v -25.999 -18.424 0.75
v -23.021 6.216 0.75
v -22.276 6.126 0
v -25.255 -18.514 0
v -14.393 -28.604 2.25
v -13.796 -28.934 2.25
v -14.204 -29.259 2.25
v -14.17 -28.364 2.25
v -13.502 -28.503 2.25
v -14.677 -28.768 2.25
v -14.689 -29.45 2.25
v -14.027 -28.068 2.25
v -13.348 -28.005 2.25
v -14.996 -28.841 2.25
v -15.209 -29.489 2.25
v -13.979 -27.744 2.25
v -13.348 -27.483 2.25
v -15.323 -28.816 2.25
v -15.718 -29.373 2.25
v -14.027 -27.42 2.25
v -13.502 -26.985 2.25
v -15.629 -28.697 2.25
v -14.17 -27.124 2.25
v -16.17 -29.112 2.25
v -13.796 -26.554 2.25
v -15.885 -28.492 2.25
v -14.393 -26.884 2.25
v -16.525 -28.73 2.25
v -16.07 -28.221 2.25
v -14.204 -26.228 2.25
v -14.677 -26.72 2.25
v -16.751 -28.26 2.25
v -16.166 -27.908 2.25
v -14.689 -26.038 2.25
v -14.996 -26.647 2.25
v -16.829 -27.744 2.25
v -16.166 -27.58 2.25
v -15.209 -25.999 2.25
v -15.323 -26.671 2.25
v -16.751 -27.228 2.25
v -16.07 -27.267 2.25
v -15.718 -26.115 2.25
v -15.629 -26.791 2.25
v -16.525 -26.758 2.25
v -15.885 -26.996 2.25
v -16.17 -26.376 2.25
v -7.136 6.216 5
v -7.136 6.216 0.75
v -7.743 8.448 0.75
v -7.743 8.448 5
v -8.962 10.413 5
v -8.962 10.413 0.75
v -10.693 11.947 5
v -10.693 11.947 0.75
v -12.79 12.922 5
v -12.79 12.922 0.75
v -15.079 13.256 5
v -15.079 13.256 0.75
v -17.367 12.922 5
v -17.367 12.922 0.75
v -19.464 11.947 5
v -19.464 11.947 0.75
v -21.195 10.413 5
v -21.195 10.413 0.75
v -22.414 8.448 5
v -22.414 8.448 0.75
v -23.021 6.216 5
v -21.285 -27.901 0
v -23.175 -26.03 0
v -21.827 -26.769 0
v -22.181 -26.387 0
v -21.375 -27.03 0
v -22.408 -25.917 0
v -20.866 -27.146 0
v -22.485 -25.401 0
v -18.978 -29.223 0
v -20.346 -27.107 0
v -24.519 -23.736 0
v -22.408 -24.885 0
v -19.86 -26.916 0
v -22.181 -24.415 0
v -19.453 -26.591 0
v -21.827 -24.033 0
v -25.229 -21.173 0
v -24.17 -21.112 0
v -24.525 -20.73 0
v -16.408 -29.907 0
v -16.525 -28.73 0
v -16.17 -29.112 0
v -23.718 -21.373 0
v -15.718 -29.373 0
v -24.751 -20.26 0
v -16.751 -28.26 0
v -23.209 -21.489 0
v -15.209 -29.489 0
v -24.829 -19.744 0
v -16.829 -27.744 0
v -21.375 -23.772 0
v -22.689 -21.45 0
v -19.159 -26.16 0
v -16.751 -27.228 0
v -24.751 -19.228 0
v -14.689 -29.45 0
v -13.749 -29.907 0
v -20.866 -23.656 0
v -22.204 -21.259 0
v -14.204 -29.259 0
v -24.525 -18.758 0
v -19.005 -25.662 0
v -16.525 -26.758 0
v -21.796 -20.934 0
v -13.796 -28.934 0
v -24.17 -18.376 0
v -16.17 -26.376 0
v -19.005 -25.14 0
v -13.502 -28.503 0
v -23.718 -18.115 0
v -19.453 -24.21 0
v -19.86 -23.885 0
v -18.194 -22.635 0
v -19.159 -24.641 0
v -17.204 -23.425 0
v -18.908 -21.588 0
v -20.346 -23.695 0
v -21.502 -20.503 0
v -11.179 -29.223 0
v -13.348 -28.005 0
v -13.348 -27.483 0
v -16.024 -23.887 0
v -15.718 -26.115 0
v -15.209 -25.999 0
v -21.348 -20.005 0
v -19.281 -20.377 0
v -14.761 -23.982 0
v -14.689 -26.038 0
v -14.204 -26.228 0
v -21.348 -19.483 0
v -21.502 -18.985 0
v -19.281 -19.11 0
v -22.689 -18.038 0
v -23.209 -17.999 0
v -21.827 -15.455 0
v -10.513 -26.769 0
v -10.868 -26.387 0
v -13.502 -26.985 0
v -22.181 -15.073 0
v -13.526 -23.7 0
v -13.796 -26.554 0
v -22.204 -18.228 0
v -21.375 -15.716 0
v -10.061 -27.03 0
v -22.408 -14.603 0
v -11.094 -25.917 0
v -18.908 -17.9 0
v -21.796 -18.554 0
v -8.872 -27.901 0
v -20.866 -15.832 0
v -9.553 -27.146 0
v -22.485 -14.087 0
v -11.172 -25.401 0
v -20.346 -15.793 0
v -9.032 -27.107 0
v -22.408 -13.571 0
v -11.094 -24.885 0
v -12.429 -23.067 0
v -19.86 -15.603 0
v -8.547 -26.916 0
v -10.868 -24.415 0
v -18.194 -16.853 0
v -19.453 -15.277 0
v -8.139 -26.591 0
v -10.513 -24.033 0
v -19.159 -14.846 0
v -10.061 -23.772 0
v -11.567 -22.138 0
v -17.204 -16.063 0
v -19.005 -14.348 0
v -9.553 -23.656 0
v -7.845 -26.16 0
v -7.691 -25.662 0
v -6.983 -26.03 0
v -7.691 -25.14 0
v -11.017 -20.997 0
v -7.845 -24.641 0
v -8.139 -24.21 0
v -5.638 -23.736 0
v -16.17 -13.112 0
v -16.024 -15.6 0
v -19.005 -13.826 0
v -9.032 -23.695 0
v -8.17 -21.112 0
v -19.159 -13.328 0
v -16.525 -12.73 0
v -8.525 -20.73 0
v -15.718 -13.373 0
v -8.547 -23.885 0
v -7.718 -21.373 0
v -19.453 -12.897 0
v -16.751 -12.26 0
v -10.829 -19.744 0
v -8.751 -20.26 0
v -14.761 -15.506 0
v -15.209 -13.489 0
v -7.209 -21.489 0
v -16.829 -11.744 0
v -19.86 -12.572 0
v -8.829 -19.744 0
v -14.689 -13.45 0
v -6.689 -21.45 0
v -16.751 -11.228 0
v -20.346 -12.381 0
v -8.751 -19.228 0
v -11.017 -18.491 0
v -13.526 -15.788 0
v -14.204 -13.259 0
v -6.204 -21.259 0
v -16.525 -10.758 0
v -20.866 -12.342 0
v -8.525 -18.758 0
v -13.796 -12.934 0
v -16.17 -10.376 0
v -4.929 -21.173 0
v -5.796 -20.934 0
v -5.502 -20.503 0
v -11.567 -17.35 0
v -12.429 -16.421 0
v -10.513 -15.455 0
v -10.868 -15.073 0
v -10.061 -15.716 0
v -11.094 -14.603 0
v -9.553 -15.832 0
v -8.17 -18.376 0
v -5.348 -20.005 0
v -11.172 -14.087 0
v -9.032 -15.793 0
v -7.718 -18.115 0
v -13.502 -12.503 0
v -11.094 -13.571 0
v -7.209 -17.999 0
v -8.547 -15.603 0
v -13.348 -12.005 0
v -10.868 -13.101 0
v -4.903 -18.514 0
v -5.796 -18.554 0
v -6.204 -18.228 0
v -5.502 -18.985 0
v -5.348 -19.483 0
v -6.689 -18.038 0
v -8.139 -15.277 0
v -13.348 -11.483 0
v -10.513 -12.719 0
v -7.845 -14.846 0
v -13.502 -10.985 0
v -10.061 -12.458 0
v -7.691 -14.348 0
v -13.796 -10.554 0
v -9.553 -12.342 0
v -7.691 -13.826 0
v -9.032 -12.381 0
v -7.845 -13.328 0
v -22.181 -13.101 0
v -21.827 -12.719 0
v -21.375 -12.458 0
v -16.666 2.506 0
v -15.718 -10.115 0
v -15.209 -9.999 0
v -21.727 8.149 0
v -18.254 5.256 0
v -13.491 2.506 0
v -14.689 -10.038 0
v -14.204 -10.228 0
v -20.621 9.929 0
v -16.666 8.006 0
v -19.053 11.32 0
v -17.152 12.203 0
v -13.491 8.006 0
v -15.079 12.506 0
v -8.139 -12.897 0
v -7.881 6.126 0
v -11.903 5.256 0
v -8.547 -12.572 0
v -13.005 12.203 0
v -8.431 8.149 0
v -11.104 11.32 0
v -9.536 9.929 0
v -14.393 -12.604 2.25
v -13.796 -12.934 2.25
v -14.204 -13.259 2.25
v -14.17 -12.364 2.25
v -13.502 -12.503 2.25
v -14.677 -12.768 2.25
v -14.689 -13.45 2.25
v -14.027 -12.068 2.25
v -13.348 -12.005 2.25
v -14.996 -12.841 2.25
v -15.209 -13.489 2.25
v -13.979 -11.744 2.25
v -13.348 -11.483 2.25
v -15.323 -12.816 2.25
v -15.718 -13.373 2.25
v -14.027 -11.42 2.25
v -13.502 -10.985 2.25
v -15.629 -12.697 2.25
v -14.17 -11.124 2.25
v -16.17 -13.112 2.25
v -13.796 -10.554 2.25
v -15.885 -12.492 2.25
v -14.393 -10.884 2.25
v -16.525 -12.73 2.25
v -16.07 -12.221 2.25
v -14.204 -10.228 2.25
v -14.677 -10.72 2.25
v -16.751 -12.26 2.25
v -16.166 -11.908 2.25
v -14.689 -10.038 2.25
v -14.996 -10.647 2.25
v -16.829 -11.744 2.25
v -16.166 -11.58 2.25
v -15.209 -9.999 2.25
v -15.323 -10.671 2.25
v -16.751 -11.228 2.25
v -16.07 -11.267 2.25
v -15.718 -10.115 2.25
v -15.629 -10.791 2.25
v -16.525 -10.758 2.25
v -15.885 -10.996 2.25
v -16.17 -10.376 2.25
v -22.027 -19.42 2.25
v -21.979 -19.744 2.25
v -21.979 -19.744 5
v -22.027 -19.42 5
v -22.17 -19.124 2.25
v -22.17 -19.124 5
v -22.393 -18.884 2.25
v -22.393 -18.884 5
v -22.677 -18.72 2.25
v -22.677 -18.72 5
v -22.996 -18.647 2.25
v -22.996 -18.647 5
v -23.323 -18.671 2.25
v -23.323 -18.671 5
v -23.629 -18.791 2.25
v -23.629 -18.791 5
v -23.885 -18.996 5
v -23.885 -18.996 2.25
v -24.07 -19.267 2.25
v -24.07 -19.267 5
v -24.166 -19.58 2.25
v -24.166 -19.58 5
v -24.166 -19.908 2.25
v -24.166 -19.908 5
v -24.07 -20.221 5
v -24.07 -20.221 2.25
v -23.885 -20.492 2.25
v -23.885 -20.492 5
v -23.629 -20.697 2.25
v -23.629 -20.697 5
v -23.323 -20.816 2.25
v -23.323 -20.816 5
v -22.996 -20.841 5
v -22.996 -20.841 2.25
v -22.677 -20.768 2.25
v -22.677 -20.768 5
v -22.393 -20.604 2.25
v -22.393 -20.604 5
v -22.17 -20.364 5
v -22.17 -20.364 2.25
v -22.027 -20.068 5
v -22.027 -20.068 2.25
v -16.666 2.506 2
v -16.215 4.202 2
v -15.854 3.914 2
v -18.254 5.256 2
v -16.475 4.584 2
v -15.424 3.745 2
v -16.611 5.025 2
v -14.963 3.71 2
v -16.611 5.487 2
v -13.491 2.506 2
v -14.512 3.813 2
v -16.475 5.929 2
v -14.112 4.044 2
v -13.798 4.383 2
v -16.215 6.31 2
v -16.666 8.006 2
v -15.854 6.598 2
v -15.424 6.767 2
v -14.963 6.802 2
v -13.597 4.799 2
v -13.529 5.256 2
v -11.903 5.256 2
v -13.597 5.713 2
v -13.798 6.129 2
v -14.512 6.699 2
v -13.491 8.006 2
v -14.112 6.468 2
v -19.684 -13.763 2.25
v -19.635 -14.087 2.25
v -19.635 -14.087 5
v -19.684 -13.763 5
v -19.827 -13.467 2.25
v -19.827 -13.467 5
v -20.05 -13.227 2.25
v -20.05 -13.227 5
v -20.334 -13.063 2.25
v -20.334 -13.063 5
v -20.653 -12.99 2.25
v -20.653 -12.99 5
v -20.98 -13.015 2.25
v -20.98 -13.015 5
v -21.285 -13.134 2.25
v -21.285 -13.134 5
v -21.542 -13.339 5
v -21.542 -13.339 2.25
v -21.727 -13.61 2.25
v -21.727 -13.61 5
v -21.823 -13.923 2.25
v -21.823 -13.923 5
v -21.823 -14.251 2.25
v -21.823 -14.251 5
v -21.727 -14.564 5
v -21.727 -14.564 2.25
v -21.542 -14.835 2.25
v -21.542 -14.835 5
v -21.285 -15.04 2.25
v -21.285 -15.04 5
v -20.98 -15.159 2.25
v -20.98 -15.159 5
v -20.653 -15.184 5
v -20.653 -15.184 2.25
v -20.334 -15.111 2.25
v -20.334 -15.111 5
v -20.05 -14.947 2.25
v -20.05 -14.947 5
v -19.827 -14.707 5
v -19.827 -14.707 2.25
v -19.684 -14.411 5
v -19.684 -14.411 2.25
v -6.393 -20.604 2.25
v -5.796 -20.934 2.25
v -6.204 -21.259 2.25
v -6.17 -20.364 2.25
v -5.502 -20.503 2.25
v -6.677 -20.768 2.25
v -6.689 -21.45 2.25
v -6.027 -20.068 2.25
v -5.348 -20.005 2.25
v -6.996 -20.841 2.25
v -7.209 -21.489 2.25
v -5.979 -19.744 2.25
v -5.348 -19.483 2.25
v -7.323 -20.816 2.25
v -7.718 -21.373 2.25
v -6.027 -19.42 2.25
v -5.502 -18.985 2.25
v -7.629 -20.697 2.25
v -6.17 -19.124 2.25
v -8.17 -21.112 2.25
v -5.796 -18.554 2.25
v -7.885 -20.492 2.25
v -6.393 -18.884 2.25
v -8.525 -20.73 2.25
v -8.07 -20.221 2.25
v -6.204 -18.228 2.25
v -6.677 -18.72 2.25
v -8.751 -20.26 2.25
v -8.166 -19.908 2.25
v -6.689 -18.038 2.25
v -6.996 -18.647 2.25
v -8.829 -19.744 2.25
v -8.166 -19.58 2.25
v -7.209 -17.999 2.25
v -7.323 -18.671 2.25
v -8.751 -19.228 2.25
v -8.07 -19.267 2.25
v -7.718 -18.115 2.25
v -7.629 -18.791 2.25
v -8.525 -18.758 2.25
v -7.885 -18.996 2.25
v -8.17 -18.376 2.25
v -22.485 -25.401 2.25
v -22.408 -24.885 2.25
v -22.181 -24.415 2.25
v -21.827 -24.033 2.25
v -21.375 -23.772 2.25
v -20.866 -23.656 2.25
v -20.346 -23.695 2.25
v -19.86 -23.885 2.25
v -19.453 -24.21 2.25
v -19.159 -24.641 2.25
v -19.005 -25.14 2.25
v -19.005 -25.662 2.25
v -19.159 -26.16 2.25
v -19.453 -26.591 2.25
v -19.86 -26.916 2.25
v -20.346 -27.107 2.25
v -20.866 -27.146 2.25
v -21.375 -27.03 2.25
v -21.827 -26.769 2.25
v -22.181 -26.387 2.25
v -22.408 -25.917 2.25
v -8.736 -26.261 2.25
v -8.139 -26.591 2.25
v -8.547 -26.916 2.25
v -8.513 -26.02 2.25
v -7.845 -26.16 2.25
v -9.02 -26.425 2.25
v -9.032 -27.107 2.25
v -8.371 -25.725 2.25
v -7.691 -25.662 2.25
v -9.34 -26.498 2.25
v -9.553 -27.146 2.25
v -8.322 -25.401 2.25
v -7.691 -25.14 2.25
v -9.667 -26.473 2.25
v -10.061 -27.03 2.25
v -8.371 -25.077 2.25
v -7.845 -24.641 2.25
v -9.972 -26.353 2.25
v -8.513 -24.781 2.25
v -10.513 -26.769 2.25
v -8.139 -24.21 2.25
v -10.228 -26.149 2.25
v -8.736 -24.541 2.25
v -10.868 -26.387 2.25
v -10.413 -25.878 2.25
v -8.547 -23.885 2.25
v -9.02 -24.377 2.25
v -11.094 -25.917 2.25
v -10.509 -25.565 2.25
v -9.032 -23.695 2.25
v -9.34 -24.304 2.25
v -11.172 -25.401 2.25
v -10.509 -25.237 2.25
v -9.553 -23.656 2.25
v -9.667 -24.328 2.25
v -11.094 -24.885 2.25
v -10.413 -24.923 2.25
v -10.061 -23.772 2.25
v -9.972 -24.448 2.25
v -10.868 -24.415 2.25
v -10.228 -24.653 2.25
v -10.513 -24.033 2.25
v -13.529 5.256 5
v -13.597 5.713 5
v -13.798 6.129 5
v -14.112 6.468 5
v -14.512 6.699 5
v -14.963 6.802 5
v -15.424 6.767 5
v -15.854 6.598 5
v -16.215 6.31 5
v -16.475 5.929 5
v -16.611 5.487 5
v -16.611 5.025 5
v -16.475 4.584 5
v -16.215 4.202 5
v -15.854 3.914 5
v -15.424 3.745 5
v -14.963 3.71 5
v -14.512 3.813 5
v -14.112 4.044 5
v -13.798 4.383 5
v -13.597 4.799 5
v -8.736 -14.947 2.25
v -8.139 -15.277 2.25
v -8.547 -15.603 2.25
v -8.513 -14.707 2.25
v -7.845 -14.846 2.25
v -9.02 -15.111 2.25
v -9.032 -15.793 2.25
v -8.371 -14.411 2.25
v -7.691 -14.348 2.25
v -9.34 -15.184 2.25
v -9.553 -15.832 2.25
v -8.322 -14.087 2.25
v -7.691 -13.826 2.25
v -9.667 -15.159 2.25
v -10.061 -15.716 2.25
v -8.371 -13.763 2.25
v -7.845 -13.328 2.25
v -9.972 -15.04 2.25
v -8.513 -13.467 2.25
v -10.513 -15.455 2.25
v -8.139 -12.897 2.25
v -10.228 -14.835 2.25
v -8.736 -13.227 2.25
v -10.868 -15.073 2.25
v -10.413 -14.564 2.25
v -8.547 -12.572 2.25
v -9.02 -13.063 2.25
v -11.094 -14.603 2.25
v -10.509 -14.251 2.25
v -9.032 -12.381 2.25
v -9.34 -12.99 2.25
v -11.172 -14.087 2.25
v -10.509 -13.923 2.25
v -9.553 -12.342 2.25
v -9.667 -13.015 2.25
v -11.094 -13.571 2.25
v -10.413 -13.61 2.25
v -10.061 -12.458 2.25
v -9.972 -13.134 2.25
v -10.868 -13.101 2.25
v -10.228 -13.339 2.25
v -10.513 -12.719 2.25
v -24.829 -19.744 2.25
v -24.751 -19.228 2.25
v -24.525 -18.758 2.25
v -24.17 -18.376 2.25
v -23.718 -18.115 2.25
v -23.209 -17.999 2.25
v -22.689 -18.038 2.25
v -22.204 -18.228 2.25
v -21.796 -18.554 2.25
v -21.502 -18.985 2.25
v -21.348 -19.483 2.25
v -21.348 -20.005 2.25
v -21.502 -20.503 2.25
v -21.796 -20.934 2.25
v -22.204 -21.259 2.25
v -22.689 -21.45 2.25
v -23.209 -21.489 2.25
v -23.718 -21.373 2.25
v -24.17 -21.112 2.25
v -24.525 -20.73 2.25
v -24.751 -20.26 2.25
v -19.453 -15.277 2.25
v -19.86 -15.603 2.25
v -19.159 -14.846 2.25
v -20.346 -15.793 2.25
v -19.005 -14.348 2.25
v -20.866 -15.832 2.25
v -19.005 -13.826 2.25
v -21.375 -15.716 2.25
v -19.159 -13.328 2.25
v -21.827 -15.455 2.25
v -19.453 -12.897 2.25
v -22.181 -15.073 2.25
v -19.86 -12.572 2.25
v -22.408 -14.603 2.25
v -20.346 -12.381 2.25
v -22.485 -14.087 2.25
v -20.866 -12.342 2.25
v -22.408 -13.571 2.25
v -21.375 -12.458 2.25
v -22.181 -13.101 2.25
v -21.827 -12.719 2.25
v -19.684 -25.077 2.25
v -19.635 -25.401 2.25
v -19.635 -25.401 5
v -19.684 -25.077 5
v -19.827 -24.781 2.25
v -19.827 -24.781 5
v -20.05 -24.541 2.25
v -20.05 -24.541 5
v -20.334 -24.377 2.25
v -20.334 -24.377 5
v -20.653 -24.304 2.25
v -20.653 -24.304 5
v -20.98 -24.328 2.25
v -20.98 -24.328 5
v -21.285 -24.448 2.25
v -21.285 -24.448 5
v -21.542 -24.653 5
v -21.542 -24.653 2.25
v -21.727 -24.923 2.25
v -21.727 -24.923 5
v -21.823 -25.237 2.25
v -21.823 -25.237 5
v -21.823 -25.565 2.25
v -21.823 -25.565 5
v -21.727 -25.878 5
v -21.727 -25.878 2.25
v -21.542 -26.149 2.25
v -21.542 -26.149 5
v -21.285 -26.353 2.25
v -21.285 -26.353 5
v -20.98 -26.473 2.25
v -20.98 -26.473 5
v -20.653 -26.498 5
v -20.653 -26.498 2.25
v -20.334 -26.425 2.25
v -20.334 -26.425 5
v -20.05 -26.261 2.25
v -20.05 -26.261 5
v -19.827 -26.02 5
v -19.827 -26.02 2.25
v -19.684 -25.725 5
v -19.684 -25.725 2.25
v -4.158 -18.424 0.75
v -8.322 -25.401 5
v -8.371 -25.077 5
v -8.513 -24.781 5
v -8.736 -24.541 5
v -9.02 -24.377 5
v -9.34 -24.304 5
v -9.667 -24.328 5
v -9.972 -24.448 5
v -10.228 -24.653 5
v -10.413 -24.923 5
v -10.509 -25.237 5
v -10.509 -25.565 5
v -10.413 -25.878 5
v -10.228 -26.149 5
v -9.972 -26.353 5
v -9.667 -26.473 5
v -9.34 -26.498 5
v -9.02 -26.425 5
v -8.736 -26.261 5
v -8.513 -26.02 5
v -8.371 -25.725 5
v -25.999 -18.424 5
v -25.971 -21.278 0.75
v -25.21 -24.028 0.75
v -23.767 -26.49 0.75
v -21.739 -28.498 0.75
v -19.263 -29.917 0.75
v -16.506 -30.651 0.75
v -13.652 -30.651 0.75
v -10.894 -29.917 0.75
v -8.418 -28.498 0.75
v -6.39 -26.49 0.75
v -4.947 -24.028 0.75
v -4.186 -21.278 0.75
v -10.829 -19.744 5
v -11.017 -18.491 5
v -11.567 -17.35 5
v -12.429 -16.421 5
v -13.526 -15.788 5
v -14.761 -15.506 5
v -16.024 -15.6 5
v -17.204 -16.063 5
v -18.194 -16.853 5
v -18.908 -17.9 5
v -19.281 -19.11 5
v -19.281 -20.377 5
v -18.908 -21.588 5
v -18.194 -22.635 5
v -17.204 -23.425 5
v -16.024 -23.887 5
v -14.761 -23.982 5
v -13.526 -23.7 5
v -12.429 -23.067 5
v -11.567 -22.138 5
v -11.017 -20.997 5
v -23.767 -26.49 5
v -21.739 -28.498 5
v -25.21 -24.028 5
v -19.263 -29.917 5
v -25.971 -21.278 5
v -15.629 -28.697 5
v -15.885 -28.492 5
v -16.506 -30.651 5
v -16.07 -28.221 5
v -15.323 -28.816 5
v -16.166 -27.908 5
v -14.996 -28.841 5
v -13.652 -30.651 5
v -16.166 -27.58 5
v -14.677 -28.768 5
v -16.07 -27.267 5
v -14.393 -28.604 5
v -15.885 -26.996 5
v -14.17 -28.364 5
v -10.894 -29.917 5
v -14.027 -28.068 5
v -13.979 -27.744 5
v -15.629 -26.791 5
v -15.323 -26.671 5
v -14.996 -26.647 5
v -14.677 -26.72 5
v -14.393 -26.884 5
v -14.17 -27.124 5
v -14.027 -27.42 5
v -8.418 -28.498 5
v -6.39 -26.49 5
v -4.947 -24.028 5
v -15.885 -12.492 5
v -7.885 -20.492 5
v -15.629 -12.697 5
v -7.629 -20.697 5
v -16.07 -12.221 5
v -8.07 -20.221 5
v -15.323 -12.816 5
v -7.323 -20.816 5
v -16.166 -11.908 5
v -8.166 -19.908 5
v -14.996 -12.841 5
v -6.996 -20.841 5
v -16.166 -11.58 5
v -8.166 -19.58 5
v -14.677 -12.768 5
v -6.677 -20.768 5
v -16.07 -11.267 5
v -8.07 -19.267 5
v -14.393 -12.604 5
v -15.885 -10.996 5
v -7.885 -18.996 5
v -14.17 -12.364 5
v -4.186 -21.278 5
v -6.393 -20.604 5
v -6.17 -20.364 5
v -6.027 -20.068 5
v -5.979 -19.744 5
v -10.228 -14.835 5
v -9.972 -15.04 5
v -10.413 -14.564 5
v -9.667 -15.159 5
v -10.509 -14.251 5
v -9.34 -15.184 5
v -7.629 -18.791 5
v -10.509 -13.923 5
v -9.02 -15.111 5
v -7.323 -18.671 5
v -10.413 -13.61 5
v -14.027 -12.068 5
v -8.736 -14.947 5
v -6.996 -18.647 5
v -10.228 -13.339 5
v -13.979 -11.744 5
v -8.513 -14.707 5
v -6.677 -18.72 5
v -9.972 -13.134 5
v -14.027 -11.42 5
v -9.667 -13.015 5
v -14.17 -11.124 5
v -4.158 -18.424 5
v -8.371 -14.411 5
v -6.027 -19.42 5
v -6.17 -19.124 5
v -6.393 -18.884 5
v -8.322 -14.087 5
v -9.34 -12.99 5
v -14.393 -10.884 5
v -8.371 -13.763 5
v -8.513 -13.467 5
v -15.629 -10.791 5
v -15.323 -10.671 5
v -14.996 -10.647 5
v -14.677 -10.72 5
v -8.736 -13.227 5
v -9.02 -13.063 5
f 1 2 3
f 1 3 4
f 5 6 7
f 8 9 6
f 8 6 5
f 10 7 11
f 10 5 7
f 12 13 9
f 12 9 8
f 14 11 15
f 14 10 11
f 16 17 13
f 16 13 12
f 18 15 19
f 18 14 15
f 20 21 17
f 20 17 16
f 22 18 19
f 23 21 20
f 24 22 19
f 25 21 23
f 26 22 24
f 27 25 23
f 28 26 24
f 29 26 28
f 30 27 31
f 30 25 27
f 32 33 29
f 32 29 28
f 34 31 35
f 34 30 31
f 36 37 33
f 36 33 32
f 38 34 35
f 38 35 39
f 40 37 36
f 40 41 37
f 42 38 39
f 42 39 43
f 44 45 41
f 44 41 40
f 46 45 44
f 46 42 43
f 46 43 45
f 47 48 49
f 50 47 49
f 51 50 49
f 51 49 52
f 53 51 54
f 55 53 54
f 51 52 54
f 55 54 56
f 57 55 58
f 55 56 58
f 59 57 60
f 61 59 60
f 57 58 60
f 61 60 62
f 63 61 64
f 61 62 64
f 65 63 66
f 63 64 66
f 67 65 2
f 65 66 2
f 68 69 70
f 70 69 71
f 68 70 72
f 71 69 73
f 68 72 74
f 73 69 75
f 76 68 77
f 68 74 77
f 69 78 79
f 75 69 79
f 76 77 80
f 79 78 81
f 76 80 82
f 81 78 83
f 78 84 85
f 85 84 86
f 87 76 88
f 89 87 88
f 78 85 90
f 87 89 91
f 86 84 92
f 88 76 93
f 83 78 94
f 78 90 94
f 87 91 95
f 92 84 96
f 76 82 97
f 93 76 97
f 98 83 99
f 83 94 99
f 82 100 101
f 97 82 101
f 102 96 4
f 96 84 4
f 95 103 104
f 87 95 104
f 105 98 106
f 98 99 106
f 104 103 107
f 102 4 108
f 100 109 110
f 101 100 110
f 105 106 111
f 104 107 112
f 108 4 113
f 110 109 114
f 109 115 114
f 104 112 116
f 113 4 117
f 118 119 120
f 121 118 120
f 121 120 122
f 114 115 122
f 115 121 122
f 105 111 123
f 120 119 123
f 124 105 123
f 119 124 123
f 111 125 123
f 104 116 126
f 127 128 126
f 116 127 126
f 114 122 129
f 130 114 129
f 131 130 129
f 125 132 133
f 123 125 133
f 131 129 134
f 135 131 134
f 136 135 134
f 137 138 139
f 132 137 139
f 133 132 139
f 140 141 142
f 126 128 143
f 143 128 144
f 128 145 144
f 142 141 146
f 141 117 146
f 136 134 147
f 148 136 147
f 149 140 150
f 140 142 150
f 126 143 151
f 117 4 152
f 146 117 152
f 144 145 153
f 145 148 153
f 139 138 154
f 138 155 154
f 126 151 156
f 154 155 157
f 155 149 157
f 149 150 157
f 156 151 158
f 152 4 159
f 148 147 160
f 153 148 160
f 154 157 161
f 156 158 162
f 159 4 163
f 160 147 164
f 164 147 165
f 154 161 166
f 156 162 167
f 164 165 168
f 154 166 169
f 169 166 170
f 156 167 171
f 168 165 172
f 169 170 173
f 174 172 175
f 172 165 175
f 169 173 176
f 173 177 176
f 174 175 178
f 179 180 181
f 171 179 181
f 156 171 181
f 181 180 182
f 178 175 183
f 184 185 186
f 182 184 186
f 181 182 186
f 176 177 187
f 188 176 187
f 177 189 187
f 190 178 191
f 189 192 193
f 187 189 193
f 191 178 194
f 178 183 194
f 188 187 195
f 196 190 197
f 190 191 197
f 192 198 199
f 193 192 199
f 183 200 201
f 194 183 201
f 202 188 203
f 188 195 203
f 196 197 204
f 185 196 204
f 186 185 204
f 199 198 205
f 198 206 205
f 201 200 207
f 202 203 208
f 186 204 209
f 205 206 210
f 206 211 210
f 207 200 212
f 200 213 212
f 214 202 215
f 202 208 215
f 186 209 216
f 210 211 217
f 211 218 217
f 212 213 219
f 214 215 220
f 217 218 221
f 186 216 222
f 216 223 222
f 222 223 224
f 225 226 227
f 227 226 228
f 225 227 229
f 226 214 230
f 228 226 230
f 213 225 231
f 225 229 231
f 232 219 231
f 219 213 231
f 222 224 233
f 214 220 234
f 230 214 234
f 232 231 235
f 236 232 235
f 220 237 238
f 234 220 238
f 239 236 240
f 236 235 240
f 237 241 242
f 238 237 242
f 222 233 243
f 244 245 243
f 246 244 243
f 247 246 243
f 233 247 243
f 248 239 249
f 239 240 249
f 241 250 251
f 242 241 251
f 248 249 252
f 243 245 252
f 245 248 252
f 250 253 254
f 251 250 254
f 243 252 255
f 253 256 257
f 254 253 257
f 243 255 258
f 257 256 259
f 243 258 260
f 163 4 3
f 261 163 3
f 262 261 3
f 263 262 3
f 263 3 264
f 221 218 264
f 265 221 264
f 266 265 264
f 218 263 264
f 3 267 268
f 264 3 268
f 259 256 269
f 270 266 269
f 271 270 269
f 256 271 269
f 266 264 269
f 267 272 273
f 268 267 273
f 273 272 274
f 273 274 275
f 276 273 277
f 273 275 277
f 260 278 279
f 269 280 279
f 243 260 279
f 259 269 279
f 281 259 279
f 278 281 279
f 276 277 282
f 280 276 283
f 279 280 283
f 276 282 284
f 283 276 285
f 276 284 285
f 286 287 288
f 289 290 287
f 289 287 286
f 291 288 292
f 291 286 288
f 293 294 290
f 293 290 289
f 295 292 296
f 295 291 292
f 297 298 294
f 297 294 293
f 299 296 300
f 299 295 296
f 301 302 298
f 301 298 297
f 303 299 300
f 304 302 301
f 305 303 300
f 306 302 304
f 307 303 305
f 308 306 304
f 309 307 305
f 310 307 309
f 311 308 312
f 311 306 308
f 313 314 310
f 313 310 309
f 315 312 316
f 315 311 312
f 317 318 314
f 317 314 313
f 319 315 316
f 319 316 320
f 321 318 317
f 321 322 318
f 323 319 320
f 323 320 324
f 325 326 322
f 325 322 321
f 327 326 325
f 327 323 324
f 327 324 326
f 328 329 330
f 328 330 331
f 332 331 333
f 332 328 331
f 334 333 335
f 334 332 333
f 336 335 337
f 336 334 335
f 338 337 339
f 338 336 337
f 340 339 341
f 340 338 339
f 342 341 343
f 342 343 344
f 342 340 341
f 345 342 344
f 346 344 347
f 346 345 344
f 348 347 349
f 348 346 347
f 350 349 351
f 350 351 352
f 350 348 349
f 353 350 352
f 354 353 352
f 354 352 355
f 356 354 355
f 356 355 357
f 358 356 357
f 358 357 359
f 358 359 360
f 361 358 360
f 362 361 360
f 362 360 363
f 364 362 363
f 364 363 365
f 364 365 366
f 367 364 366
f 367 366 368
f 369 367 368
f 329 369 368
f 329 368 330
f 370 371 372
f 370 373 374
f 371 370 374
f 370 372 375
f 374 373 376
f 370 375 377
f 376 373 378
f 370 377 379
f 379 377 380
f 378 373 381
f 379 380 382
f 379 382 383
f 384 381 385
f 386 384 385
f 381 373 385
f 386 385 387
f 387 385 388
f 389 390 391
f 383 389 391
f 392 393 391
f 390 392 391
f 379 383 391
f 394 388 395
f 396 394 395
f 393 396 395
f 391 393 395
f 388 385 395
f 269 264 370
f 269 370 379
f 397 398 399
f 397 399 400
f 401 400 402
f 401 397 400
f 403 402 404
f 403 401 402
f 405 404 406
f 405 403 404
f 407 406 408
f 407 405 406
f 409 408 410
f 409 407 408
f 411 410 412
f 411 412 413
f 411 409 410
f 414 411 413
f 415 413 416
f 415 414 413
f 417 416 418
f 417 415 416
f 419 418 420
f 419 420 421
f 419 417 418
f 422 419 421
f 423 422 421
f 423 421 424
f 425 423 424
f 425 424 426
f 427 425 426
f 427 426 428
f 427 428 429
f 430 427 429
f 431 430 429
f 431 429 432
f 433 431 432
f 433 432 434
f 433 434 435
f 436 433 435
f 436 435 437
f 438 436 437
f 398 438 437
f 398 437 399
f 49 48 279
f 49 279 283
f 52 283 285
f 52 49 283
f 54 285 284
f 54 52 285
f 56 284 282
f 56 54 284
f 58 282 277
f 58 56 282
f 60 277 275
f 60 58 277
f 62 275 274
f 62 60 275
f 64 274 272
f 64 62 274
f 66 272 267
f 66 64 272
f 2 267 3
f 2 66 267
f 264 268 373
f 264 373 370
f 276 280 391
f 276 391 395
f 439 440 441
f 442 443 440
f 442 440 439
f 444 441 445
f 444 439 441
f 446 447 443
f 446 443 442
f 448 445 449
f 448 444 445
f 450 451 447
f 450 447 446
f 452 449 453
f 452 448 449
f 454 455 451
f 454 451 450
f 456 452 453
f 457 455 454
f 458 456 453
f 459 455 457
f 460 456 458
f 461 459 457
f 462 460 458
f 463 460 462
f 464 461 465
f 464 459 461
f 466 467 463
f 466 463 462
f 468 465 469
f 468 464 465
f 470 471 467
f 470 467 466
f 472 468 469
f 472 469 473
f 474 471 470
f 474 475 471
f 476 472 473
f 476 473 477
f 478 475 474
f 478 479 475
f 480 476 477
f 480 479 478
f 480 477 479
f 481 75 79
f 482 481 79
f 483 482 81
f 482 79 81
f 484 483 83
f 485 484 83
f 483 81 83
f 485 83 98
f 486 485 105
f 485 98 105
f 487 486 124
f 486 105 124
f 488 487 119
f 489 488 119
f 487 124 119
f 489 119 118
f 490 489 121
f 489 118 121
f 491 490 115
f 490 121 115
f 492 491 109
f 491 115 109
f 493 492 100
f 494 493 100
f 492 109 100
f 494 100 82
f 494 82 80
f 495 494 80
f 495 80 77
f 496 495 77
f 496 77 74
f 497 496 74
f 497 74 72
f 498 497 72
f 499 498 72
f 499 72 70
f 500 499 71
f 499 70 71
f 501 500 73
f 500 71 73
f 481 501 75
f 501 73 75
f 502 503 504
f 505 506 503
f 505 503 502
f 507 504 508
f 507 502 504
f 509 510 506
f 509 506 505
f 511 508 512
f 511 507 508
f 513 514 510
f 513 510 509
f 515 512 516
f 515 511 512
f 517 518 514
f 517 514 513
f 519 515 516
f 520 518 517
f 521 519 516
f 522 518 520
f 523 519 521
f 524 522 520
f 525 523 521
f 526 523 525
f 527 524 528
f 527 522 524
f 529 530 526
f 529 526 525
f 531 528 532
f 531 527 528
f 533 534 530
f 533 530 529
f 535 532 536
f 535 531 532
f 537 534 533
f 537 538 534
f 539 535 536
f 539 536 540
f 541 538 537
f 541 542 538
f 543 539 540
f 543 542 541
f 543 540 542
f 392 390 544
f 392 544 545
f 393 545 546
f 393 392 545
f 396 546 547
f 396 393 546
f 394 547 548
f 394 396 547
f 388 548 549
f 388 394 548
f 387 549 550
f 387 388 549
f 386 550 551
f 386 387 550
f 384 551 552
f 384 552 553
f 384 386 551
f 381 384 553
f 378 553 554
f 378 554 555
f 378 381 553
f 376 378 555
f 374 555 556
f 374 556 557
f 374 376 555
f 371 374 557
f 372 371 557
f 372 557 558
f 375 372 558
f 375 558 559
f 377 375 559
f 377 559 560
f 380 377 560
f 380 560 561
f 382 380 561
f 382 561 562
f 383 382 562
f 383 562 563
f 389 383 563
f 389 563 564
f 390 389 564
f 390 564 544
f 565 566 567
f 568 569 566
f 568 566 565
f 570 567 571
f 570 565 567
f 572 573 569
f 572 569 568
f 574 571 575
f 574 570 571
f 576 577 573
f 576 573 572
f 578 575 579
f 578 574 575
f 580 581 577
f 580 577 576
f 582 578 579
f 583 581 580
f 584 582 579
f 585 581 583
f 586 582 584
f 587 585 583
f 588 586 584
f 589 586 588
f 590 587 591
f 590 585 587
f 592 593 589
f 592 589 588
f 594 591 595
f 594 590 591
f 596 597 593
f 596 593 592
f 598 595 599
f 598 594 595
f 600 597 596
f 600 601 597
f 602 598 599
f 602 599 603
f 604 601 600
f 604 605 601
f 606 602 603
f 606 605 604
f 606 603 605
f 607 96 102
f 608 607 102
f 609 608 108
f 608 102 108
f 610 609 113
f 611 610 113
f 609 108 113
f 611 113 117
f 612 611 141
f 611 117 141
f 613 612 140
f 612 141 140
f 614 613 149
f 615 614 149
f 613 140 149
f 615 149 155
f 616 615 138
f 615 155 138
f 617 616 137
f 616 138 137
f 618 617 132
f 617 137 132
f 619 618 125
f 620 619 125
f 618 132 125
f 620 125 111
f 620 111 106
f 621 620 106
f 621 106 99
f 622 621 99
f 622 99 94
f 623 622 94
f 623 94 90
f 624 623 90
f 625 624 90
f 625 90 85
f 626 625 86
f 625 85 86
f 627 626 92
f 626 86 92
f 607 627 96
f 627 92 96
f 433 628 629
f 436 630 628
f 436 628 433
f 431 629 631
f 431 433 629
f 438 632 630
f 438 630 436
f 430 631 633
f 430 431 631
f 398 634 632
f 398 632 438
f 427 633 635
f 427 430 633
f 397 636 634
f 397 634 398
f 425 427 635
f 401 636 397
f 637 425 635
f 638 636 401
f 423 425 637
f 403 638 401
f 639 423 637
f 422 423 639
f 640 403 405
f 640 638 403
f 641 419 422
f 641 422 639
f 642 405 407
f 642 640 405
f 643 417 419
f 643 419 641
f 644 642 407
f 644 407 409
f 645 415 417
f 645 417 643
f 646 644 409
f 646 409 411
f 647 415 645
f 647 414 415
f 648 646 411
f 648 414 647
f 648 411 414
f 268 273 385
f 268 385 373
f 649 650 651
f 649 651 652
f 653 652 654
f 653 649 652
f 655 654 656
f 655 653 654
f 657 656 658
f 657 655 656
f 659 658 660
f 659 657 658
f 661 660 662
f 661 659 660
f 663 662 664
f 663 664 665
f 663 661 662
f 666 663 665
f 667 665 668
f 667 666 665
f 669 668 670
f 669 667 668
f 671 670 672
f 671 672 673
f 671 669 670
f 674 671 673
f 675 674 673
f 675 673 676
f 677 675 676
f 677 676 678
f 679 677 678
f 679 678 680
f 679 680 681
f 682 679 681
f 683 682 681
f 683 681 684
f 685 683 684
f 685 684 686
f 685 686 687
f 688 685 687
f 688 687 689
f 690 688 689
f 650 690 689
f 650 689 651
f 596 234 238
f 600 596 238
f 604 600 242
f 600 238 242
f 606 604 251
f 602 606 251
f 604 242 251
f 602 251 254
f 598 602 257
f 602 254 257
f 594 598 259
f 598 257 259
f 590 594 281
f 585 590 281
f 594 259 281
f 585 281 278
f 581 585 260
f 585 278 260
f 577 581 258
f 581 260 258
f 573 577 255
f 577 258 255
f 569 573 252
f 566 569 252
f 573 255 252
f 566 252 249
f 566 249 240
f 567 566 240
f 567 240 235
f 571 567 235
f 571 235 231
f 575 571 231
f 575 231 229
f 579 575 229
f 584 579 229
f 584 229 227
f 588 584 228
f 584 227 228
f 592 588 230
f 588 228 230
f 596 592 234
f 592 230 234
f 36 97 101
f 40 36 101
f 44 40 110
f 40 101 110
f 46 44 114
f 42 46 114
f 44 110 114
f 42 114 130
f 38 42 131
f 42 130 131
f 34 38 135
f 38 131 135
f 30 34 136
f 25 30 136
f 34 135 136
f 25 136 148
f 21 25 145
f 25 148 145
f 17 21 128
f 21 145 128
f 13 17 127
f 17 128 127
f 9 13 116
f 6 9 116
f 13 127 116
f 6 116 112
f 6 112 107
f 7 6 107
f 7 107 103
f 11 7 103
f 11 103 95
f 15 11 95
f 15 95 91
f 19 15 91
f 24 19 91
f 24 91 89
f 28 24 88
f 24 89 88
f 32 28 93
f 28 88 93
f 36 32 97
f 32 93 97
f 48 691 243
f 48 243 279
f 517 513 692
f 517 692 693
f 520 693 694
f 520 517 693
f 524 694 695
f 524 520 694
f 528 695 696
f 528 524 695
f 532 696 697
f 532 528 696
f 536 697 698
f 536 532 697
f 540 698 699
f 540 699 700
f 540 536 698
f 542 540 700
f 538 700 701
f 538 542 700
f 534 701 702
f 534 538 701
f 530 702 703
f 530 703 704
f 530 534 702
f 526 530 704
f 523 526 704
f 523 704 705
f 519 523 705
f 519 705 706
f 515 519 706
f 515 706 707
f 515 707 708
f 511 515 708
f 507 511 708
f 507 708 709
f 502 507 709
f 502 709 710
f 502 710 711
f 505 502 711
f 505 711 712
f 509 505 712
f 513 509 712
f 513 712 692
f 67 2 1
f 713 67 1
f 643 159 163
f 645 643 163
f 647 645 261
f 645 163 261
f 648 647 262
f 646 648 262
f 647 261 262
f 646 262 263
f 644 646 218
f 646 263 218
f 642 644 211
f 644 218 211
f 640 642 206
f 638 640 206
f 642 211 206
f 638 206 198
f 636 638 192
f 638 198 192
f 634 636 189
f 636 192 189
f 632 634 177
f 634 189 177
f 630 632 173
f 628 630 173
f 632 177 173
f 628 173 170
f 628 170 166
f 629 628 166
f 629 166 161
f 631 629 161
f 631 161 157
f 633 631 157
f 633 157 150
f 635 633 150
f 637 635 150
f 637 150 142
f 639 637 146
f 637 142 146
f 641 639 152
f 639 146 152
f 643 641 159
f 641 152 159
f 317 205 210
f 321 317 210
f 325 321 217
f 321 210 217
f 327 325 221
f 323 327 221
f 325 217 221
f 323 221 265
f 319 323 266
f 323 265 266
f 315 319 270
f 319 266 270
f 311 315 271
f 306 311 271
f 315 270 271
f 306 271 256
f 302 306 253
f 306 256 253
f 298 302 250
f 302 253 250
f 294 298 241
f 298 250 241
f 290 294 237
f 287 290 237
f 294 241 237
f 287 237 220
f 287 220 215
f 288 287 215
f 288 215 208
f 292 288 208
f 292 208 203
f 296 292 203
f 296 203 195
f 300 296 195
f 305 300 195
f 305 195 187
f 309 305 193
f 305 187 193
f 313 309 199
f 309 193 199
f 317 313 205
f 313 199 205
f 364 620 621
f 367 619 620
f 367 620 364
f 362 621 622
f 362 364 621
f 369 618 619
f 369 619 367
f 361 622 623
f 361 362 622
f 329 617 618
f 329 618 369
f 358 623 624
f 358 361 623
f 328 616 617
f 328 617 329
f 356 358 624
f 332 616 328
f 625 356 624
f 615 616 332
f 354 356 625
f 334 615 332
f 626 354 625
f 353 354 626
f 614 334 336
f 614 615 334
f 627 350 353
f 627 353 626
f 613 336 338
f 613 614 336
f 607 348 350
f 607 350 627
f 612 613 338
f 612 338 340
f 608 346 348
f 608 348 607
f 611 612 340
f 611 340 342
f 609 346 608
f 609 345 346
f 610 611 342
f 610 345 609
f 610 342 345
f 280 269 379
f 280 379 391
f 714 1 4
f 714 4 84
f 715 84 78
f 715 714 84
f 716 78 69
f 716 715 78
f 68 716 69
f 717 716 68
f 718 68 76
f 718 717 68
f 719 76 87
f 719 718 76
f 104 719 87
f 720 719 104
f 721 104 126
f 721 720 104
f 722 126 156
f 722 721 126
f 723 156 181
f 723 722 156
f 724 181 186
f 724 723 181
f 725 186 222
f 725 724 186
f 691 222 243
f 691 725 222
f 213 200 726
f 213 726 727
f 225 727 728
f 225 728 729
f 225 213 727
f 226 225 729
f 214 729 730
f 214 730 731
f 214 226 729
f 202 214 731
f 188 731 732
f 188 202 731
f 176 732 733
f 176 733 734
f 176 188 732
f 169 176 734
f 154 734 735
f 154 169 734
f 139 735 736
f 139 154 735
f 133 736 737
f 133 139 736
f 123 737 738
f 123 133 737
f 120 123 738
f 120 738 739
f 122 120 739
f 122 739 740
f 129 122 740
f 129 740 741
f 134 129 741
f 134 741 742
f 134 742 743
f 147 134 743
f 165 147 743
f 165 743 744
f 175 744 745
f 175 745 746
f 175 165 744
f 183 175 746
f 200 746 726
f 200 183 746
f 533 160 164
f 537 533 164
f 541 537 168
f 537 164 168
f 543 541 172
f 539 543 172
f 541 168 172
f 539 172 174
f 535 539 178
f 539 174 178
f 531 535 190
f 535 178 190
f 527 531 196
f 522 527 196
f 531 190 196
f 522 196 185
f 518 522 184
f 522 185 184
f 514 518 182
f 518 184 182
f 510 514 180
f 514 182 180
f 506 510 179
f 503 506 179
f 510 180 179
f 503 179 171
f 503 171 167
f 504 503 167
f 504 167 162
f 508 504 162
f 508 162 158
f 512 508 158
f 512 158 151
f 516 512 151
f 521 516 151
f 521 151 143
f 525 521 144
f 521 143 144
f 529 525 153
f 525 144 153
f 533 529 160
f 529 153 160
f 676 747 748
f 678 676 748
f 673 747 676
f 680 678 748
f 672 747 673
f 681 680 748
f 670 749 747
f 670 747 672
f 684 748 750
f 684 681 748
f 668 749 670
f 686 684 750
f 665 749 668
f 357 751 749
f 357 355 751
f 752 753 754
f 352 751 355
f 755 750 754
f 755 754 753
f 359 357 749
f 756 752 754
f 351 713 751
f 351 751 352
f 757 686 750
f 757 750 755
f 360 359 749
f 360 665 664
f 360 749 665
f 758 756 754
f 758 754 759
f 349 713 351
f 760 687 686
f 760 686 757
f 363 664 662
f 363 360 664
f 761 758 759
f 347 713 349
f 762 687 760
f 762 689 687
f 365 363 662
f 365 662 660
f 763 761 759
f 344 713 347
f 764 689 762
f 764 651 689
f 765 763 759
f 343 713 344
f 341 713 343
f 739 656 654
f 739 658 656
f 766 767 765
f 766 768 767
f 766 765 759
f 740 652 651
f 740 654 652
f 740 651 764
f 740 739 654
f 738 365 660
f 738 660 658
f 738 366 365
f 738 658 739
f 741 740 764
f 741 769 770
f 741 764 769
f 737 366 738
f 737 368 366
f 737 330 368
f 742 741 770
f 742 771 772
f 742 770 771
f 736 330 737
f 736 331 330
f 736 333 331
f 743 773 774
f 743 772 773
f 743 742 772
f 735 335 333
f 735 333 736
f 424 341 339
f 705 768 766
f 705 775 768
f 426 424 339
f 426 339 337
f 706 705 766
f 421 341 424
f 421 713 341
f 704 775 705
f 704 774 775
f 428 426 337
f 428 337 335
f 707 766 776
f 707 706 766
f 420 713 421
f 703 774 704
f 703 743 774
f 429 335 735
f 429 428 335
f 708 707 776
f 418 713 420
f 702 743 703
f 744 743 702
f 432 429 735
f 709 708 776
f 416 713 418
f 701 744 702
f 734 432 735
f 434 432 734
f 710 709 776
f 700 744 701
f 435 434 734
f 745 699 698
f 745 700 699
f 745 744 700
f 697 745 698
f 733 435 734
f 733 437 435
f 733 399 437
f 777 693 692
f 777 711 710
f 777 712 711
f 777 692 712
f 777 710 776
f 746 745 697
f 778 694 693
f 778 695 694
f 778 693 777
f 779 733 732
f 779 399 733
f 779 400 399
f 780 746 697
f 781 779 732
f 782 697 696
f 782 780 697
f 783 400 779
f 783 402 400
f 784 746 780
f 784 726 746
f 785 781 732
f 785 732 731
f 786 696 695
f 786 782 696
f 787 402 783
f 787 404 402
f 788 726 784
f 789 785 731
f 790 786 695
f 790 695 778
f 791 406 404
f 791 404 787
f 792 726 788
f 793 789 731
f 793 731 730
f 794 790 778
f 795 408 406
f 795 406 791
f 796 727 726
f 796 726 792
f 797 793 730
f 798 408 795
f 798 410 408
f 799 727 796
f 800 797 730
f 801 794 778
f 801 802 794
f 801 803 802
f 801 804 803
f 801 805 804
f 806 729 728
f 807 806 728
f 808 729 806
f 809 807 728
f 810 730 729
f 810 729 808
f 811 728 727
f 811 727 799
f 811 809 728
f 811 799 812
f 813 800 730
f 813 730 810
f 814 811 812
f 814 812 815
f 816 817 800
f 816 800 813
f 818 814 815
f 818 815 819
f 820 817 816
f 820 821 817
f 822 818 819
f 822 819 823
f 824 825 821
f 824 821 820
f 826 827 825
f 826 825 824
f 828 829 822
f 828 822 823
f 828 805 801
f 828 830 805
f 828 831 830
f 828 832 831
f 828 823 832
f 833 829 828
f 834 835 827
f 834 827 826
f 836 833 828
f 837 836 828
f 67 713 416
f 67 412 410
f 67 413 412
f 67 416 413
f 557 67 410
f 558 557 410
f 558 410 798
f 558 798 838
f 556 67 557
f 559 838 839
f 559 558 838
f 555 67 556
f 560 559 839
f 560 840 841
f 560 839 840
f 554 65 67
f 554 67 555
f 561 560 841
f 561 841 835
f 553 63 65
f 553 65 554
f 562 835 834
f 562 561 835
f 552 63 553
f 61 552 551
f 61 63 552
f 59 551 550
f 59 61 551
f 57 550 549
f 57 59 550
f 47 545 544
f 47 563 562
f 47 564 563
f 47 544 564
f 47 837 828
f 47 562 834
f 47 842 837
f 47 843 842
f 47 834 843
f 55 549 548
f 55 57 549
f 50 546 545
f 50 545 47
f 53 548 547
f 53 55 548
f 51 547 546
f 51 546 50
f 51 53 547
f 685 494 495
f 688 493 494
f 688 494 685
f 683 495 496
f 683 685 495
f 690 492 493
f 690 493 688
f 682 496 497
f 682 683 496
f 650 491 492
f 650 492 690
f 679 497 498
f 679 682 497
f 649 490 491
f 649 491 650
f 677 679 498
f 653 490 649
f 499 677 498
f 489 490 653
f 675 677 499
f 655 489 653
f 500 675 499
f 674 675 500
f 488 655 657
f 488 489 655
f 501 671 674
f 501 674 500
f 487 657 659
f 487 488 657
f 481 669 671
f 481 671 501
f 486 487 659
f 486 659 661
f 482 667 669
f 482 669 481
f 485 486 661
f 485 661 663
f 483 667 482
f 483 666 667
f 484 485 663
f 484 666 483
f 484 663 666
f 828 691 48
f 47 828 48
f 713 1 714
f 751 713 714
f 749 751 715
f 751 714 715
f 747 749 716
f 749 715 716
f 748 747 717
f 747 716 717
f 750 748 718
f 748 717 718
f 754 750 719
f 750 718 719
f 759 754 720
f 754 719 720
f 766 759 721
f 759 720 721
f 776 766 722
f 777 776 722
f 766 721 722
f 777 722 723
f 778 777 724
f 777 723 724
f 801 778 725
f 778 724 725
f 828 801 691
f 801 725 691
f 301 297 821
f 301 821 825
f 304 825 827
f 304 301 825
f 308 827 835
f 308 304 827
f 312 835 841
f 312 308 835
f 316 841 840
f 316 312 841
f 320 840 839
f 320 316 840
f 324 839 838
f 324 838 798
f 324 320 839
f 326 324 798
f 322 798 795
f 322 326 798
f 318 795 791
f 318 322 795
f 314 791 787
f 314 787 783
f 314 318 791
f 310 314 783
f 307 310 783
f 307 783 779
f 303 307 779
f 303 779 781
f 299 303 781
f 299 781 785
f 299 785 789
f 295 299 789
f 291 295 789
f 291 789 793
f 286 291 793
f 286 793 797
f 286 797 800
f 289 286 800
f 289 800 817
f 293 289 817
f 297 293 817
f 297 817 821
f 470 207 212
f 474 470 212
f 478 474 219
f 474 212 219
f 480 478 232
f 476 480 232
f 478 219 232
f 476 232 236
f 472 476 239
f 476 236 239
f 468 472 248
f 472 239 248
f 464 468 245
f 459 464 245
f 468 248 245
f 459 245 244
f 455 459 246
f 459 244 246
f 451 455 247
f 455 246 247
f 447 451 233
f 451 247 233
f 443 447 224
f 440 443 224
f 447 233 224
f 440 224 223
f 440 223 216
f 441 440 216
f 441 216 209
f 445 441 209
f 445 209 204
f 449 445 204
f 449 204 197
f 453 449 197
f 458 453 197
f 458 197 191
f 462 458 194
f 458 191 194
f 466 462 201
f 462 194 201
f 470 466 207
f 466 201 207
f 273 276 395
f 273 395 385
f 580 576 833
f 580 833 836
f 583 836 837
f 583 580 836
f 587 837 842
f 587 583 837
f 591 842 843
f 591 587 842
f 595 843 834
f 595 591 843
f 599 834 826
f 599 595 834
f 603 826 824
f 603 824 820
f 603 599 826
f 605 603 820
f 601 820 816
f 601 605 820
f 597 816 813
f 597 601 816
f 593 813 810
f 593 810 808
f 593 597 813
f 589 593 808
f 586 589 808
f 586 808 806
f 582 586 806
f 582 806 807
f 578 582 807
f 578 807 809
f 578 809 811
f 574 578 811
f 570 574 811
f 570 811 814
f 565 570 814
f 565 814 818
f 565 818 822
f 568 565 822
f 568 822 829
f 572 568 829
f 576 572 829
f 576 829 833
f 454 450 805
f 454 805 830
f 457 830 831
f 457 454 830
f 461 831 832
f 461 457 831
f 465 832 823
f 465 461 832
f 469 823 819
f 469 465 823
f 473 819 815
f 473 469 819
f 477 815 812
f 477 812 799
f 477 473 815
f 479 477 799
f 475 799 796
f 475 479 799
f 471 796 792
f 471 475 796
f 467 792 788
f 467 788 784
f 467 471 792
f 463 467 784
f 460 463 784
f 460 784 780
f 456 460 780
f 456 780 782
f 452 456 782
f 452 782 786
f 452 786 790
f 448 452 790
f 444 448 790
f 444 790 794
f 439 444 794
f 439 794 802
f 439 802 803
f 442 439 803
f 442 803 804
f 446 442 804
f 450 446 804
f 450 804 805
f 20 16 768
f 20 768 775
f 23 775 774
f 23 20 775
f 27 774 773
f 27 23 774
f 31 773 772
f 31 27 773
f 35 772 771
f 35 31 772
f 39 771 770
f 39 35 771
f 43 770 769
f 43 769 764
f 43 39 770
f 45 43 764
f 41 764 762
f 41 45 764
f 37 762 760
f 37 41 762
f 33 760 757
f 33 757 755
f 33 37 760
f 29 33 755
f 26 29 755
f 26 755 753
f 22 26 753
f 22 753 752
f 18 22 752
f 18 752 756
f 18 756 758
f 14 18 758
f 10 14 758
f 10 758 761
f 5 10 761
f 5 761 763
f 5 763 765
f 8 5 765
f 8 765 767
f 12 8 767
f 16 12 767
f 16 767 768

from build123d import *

# Parameters (mm, degrees)
SKETCH1_R           = 1.55
SKETCH1_R_2         = 4.25
SKETCH1_R_3         = 1.1
BOSS_EXTRUDE1_DEPTH = 5
CUT_EXTRUDE2_DEPTH  = 2
SKETCH4_R           = 1.75
CUT_EXTRUDE3_DEPTH  = 2.25
CHAFL_N1_SIZE       = 0.75


with BuildPart() as part:
    # Sketch1 → Boss-Extrude1 (new body)
    with BuildSketch(Plane.XY):
        with BuildLine():
            Line((-23.020815218, 6.216096398), (-25.999136894, -18.423903602))
            ThreePointArc((-25.999136894, -18.423903602), (-15.078624085, -30.743903602), (-4.158111277, -18.423903602))
            Line((-4.158111277, -18.423903602), (-7.136432952, 6.216096398))
            ThreePointArc((-7.136432952, 6.216096398), (-15.078624085, 13.256096398), (-23.020815218, 6.216096398))
        make_face()
        with Locations((-15.078624085, 5.256096398)):
            Circle(SKETCH1_R, mode=Mode.SUBTRACT)
        with Locations((-15.078624085, -19.743903602)):
            Circle(SKETCH1_R_2, mode=Mode.SUBTRACT)
        with Locations((-7.078624085, -19.743903602)):
            Circle(SKETCH1_R_3, mode=Mode.SUBTRACT)
        with Locations((-9.421769836, -25.400757851)):
            Circle(SKETCH1_R_3, mode=Mode.SUBTRACT)
        with Locations((-15.078624085, -27.743903602)):
            Circle(SKETCH1_R_3, mode=Mode.SUBTRACT)
        with Locations((-20.735478335, -25.400757851)):
            Circle(SKETCH1_R_3, mode=Mode.SUBTRACT)
        with Locations((-23.078624085, -19.743903602)):
            Circle(SKETCH1_R_3, mode=Mode.SUBTRACT)
        with Locations((-20.735478335, -14.087049352)):
            Circle(SKETCH1_R_3, mode=Mode.SUBTRACT)
        with Locations((-15.078624085, -11.743903602)):
            Circle(SKETCH1_R_3, mode=Mode.SUBTRACT)
        with Locations((-9.421769836, -14.087049352)):
            Circle(SKETCH1_R_3, mode=Mode.SUBTRACT)
    extrude(amount=BOSS_EXTRUDE1_DEPTH)

    # Sketch3 → Cut-Extrude2 (cut)
    with BuildSketch(Plane.XY):
        Polygon((-13.490910845, 2.506096398), (-11.903197604, 5.256096398), (-13.490910845, 8.006096398), (-16.666337325, 8.006096398), (-18.254050566, 5.256096398), (-16.666337325, 2.506096398), align=None)
    extrude(amount=CUT_EXTRUDE2_DEPTH, mode=Mode.SUBTRACT)

    # Sketch4 → Cut-Extrude3 (cut)
    with BuildSketch(Plane(origin=(0, 0, 0), x_dir=(-1, 0, 0), z_dir=(0, 0, -1))):
        with Locations((23.078624085, -19.743903602)):
            Circle(SKETCH4_R)
        with Locations((20.735478335, -25.400757851)):
            Circle(SKETCH4_R)
        with Locations((15.078624085, -27.743903602)):
            Circle(SKETCH4_R)
        with Locations((9.421769836, -25.400757851)):
            Circle(SKETCH4_R)
        with Locations((7.078624085, -19.743903602)):
            Circle(SKETCH4_R)
        with Locations((9.421769836, -14.087049352)):
            Circle(SKETCH4_R)
        with Locations((15.078624085, -11.743903602)):
            Circle(SKETCH4_R)
        with Locations((20.735478335, -14.087049352)):
            Circle(SKETCH4_R)
    extrude(amount=-CUT_EXTRUDE3_DEPTH, mode=Mode.SUBTRACT)

    # Chaflán1
    chafl_n1_edges = [part.edges().sort_by_distance(p)[0] for p in [
        (-5.647272114, -6.103903602, 0),
        (-15.078624085, -30.743903602, 0),
        (-24.509976056, -6.103903602, 0),
        (-15.078624085, 13.256096398, 0),
    ]]
    chamfer(chafl_n1_edges, length=CHAFL_N1_SIZE)


solid = part.part
